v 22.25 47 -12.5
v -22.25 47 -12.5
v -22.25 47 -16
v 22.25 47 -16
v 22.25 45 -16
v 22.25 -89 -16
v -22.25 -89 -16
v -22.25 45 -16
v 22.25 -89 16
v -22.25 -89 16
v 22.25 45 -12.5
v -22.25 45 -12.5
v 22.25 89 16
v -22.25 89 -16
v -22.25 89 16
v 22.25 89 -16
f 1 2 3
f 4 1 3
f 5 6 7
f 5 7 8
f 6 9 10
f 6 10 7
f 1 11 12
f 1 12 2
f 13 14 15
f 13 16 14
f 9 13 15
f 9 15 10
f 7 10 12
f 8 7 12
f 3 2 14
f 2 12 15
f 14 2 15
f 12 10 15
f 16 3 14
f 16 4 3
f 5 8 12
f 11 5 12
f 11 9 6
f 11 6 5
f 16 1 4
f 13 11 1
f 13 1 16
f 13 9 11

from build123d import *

# Parameters (mm, degrees)
F0_W     = 2
F0_H     = 3.5
F1_DEPTH = 22.25


# Not quite as in the source:
# - a feature of the source that left no trace in its solid (it failed there, or was rolled back) is left out


with BuildPart() as f1:
    # F0 (on Right) → F1 (new body, symmetric)
    with BuildSketch(Plane.YZ):
        Polygon((89, -16), (89, 16), (-89, 16), (-89, -16), (-66, -16), (-66, -12.5), (-64, -12.5), (-64, -16), (45, -16), (45, -12.5), (47, -12.5), (47, -16), align=None)
        with Locations((-65, -14.25)):
            Rectangle(F0_W, F0_H)
    extrude(amount=F1_DEPTH, both=True)


solid = f1.part
